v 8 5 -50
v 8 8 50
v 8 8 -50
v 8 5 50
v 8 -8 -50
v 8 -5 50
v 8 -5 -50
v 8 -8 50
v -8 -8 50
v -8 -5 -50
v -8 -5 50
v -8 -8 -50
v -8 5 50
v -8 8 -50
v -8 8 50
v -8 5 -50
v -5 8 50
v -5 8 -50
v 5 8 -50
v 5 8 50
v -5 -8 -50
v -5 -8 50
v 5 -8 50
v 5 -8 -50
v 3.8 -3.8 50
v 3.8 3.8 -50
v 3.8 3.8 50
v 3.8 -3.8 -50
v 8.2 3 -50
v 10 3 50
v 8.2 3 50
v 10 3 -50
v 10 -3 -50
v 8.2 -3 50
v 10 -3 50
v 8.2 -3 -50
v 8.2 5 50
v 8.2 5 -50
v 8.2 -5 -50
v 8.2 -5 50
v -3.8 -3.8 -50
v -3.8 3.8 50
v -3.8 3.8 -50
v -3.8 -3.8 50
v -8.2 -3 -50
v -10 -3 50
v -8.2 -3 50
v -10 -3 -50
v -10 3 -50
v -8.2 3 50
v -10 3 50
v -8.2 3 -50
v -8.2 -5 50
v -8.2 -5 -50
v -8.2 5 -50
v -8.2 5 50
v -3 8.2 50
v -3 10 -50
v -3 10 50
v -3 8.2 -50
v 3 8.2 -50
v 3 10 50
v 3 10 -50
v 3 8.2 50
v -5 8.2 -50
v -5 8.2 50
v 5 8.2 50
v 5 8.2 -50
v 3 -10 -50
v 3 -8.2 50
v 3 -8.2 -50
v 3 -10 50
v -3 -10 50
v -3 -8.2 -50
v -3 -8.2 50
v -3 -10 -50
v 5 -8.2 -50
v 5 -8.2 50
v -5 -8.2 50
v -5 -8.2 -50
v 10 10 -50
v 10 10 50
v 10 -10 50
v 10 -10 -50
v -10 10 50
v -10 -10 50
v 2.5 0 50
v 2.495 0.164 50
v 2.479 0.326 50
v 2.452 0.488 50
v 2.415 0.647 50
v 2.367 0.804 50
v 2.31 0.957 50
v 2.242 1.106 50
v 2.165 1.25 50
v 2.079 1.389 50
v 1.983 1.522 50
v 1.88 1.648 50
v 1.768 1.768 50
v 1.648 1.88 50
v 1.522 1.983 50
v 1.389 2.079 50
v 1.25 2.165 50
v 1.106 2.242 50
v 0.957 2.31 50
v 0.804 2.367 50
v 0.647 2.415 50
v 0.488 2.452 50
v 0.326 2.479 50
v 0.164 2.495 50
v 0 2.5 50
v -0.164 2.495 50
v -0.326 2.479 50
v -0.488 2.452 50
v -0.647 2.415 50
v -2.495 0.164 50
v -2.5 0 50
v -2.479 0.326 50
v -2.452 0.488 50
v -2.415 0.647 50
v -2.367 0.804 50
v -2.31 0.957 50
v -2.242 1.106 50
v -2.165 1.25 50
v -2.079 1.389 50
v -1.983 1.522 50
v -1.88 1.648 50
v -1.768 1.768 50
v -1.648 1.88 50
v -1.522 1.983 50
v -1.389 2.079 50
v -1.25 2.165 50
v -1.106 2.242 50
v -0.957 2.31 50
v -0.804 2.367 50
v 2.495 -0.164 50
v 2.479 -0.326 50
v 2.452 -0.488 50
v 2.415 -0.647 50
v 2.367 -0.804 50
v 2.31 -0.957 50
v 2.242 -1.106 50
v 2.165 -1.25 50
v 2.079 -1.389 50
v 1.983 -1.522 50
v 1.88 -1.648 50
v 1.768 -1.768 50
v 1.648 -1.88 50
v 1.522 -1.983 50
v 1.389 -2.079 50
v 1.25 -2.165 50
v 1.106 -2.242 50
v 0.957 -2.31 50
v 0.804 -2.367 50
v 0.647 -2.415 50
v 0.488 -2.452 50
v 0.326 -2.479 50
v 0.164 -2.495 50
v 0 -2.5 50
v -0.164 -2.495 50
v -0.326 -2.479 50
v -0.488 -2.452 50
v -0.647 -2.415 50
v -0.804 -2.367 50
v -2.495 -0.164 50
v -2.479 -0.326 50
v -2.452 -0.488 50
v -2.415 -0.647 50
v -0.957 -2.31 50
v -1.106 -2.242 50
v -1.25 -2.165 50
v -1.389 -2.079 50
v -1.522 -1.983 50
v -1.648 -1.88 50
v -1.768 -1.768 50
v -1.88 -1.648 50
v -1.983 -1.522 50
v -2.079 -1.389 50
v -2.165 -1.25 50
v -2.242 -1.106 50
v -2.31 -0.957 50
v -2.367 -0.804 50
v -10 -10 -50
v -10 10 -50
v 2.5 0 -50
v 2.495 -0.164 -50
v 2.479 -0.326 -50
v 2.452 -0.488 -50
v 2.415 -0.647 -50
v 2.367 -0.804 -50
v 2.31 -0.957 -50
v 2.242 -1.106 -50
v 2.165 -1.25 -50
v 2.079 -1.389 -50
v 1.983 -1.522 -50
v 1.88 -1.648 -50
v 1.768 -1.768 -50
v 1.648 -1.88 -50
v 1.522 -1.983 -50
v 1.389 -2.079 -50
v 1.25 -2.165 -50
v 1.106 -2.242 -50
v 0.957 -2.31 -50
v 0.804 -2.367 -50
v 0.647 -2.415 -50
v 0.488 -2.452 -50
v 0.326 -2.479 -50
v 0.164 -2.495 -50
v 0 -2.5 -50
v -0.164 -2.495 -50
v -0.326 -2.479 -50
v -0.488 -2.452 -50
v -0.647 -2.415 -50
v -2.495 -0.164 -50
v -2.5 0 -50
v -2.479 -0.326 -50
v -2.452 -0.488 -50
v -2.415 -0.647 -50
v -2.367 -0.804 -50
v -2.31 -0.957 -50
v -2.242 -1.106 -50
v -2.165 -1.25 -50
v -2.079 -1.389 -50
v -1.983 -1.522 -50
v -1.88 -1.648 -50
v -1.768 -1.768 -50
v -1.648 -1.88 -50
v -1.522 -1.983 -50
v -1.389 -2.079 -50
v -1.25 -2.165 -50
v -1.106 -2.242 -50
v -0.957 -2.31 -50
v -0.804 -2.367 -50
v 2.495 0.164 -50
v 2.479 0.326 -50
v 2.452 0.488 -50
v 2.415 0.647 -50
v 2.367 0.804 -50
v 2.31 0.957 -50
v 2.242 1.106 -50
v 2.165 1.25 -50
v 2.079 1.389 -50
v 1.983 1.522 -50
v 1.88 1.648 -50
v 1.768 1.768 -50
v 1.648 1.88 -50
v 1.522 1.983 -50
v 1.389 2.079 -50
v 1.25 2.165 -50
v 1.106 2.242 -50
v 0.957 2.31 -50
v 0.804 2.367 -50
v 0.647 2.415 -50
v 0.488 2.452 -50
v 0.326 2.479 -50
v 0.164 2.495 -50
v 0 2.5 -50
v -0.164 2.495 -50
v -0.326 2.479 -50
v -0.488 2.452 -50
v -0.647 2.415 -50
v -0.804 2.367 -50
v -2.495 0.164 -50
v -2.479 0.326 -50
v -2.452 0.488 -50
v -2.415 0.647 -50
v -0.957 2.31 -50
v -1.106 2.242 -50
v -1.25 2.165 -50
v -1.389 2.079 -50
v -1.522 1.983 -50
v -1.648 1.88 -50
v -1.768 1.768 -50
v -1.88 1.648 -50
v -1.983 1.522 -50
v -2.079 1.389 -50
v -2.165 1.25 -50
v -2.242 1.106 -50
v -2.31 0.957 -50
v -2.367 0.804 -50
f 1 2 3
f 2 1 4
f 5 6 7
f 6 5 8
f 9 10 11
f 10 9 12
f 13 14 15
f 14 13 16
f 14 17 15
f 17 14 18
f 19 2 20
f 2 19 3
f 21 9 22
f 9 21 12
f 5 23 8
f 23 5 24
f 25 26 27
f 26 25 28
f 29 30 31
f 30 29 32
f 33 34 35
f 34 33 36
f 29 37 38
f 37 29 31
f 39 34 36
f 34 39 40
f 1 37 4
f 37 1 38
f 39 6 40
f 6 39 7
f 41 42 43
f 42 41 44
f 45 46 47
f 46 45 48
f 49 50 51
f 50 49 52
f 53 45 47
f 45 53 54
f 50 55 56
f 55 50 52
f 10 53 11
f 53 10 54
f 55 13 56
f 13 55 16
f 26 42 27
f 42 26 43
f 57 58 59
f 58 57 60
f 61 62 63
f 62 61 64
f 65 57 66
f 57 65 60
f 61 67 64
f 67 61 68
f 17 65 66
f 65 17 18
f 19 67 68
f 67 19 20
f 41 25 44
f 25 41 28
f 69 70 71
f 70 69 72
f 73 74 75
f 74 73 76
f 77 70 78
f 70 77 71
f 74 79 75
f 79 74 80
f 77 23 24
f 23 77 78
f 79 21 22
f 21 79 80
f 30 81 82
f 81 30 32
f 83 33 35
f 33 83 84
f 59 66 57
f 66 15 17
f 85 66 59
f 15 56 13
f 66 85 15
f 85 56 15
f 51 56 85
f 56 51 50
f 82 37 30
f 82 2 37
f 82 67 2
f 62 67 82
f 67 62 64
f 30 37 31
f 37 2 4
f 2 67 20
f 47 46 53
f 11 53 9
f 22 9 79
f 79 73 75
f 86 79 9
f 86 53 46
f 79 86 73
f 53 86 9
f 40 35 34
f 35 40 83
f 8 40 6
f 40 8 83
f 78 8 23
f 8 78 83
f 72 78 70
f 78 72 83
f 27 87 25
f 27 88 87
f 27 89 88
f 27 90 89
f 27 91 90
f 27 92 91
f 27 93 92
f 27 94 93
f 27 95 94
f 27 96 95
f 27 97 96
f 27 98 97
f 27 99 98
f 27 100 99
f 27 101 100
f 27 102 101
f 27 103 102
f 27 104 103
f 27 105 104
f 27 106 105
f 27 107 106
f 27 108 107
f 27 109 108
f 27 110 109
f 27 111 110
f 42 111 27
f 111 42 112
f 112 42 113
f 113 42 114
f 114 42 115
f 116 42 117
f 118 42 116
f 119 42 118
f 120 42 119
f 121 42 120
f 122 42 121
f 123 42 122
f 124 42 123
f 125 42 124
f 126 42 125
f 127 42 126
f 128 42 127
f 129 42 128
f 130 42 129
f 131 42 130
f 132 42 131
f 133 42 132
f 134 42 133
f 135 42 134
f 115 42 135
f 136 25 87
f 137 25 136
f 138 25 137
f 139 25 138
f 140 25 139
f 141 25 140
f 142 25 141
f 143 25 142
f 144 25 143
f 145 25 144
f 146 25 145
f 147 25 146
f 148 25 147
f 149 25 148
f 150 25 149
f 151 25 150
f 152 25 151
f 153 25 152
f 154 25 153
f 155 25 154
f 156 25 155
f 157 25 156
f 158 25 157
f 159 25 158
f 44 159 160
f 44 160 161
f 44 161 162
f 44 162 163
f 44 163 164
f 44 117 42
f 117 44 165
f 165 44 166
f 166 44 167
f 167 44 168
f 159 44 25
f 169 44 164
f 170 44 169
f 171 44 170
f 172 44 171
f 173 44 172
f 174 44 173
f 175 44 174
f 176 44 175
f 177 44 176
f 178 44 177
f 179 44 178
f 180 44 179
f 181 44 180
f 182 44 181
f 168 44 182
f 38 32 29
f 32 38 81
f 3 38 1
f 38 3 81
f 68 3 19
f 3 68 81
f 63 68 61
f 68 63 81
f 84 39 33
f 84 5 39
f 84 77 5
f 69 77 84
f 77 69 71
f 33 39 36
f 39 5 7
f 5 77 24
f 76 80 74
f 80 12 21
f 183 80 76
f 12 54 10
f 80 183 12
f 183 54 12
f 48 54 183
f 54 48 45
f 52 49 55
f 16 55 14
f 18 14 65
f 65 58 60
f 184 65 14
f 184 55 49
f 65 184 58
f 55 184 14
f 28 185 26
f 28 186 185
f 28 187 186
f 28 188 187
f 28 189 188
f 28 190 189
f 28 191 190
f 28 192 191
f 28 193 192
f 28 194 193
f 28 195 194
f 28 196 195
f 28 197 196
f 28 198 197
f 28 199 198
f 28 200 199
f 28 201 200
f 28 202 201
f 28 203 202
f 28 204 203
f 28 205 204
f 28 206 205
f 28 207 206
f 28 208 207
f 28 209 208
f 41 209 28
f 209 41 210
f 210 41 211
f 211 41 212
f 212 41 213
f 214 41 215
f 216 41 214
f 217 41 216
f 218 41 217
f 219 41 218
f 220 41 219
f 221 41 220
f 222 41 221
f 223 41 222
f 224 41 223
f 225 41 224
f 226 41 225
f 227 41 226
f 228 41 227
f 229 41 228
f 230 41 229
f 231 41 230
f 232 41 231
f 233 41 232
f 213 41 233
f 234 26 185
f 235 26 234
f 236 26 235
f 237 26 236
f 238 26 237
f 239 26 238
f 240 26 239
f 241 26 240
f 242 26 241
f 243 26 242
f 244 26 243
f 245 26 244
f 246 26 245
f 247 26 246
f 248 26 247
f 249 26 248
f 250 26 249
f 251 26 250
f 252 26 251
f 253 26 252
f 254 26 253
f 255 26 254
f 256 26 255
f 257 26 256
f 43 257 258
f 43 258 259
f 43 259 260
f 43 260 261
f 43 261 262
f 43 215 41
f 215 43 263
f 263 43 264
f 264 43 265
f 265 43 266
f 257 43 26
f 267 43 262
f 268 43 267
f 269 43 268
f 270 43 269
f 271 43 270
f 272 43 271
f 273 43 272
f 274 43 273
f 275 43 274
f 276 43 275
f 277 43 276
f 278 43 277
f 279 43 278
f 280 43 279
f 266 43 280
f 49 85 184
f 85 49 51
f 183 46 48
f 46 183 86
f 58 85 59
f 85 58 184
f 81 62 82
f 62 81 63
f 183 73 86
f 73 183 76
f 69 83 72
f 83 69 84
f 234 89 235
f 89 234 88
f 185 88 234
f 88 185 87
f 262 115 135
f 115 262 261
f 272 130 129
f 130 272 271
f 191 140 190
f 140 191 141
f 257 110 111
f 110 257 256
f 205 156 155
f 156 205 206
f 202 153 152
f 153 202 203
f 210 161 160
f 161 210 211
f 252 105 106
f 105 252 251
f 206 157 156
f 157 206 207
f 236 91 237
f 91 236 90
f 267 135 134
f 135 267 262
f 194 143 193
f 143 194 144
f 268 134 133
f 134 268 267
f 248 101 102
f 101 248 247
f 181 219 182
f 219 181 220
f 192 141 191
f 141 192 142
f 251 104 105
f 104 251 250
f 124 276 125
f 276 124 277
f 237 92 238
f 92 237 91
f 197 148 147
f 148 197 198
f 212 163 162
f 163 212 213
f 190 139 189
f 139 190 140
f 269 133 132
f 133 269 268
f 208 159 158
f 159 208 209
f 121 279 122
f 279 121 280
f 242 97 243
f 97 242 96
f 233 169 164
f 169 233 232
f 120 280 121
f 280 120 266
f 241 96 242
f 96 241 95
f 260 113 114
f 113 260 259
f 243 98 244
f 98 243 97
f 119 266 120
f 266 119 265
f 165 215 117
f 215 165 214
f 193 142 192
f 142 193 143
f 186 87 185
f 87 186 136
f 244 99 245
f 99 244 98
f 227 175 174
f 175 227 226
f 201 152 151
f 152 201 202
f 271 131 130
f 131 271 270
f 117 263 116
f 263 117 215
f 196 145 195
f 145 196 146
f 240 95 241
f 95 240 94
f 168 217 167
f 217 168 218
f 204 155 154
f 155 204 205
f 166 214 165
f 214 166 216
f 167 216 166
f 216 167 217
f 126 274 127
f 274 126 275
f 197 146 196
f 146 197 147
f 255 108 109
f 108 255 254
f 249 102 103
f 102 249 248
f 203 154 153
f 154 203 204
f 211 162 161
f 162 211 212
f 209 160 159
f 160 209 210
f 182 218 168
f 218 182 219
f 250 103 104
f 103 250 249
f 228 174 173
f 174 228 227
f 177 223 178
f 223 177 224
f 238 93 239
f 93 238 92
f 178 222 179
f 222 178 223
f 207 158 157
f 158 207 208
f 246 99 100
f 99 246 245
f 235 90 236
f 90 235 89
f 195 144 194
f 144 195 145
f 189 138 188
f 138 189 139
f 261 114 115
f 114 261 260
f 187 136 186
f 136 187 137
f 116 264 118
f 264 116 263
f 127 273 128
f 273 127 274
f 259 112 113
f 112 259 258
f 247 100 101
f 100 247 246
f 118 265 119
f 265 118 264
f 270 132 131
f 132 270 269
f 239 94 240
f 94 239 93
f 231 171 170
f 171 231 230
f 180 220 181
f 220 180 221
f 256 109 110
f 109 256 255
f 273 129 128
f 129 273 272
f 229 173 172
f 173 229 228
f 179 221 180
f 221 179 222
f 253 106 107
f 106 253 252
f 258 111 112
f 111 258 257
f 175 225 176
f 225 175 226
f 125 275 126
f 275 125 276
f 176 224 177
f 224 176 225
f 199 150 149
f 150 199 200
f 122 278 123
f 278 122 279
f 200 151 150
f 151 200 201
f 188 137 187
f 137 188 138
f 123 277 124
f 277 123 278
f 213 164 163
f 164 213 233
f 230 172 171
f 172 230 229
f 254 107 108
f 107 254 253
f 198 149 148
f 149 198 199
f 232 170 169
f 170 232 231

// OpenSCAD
// 20x20 aluminum extrusion profile, 100mm long (simplified 2020 T-slot)
// FIX: Ensure a single continuous 20x20x100 solid with connected cross-section.
// The previous boolean set could remove the entire mid-body, leaving only corner bits.
// This version keeps a guaranteed continuous outer body and uses conservative cuts.

$fn = 96;

// Parameters (mm)
profile_W = 20.0;
profile_H = 20.0;
length_L  = 100.0;

// Simplified 2020-ish features
center_bore_d   = 5.0;   // through bore
slot_opening_w  = 6.0;   // mouth opening at the surface
slot_neck_w     = 4.0;   // narrow neck just inside
slot_depth      = 6.2;   // depth from outer face toward center
slot_undercut_w = 10.0;  // wider internal cavity for T-nut
slot_undercut_d = 2.4;   // thickness of undercut region (radial)
wall_t          = 2.0;   // outer wall thickness
overlap         = 1.0;   // boolean robustness

// Keep a guaranteed solid core so the profile cannot split into separate corner pieces
core_size = 8.0; // mm (conservative, keeps the silhouette correct and the body connected)

// ---------- Helpers ----------
module outer_body() {
    // One continuous 20x20x100 body
    cube([profile_W, profile_H, length_L], center=true);
}

// Conservative internal cavity: hollow ring + solid core (prevents separation)
module inner_void() {
    inner_w = profile_W - 2*wall_t;
    inner_h = profile_H - 2*wall_t;

    // Hollow region is the inner rectangle minus a solid core.
    // This avoids the "two slabs" approach that can accidentally remove the entire mid-body.
    difference() {
        cube([inner_w, inner_h, length_L + 2*overlap], center=true);
        cube([core_size, core_size, length_L + 4*overlap], center=true); // extra overlap for robust boolean
    }
}

module center_bore() {
    cylinder(h=length_L + 2*overlap, r=center_bore_d/2, center=true);
}

// One face T-slot cut, oriented along +X face (cuts into the body)
module tslot_cut_1face() {
    // Ensure the slot opens to the outer face at x = +profile_W/2
    x_center    = (profile_W/2 + overlap) - slot_depth/2;
    x_uc_center = (profile_W/2 + overlap) - (slot_depth - slot_undercut_d/2);

    union() {
        // Mouth opening (at surface)
        translate([x_center, 0, 0])
            cube([slot_depth + 2*overlap, slot_opening_w, length_L + 2*overlap], center=true);

        // Neck (narrower)
        translate([x_center, 0, 0])
            cube([slot_depth + 2*overlap, slot_neck_w, length_L + 2*overlap], center=true);

        // Undercut (wider region deeper inside)
        translate([x_uc_center, 0, 0])
            cube([slot_undercut_d + 2*overlap, slot_undercut_w, length_L + 2*overlap], center=true);
    }
}

module tslots_4faces() {
    union() {
        tslot_cut_1face();                    // +X
        rotate([0,0,180]) tslot_cut_1face();  // -X
        rotate([0,0,90])  tslot_cut_1face();  // +Y
        rotate([0,0,270]) tslot_cut_1face();  // -Y
    }
}

// ---------- Final solid ----------
difference() {
    outer_body();

    // Internal cavity (keeps a solid core so the part remains one connected extrusion)
    inner_void();

    // Center bore
    center_bore();

    // 4 T-slots
    tslots_4faces();
}
